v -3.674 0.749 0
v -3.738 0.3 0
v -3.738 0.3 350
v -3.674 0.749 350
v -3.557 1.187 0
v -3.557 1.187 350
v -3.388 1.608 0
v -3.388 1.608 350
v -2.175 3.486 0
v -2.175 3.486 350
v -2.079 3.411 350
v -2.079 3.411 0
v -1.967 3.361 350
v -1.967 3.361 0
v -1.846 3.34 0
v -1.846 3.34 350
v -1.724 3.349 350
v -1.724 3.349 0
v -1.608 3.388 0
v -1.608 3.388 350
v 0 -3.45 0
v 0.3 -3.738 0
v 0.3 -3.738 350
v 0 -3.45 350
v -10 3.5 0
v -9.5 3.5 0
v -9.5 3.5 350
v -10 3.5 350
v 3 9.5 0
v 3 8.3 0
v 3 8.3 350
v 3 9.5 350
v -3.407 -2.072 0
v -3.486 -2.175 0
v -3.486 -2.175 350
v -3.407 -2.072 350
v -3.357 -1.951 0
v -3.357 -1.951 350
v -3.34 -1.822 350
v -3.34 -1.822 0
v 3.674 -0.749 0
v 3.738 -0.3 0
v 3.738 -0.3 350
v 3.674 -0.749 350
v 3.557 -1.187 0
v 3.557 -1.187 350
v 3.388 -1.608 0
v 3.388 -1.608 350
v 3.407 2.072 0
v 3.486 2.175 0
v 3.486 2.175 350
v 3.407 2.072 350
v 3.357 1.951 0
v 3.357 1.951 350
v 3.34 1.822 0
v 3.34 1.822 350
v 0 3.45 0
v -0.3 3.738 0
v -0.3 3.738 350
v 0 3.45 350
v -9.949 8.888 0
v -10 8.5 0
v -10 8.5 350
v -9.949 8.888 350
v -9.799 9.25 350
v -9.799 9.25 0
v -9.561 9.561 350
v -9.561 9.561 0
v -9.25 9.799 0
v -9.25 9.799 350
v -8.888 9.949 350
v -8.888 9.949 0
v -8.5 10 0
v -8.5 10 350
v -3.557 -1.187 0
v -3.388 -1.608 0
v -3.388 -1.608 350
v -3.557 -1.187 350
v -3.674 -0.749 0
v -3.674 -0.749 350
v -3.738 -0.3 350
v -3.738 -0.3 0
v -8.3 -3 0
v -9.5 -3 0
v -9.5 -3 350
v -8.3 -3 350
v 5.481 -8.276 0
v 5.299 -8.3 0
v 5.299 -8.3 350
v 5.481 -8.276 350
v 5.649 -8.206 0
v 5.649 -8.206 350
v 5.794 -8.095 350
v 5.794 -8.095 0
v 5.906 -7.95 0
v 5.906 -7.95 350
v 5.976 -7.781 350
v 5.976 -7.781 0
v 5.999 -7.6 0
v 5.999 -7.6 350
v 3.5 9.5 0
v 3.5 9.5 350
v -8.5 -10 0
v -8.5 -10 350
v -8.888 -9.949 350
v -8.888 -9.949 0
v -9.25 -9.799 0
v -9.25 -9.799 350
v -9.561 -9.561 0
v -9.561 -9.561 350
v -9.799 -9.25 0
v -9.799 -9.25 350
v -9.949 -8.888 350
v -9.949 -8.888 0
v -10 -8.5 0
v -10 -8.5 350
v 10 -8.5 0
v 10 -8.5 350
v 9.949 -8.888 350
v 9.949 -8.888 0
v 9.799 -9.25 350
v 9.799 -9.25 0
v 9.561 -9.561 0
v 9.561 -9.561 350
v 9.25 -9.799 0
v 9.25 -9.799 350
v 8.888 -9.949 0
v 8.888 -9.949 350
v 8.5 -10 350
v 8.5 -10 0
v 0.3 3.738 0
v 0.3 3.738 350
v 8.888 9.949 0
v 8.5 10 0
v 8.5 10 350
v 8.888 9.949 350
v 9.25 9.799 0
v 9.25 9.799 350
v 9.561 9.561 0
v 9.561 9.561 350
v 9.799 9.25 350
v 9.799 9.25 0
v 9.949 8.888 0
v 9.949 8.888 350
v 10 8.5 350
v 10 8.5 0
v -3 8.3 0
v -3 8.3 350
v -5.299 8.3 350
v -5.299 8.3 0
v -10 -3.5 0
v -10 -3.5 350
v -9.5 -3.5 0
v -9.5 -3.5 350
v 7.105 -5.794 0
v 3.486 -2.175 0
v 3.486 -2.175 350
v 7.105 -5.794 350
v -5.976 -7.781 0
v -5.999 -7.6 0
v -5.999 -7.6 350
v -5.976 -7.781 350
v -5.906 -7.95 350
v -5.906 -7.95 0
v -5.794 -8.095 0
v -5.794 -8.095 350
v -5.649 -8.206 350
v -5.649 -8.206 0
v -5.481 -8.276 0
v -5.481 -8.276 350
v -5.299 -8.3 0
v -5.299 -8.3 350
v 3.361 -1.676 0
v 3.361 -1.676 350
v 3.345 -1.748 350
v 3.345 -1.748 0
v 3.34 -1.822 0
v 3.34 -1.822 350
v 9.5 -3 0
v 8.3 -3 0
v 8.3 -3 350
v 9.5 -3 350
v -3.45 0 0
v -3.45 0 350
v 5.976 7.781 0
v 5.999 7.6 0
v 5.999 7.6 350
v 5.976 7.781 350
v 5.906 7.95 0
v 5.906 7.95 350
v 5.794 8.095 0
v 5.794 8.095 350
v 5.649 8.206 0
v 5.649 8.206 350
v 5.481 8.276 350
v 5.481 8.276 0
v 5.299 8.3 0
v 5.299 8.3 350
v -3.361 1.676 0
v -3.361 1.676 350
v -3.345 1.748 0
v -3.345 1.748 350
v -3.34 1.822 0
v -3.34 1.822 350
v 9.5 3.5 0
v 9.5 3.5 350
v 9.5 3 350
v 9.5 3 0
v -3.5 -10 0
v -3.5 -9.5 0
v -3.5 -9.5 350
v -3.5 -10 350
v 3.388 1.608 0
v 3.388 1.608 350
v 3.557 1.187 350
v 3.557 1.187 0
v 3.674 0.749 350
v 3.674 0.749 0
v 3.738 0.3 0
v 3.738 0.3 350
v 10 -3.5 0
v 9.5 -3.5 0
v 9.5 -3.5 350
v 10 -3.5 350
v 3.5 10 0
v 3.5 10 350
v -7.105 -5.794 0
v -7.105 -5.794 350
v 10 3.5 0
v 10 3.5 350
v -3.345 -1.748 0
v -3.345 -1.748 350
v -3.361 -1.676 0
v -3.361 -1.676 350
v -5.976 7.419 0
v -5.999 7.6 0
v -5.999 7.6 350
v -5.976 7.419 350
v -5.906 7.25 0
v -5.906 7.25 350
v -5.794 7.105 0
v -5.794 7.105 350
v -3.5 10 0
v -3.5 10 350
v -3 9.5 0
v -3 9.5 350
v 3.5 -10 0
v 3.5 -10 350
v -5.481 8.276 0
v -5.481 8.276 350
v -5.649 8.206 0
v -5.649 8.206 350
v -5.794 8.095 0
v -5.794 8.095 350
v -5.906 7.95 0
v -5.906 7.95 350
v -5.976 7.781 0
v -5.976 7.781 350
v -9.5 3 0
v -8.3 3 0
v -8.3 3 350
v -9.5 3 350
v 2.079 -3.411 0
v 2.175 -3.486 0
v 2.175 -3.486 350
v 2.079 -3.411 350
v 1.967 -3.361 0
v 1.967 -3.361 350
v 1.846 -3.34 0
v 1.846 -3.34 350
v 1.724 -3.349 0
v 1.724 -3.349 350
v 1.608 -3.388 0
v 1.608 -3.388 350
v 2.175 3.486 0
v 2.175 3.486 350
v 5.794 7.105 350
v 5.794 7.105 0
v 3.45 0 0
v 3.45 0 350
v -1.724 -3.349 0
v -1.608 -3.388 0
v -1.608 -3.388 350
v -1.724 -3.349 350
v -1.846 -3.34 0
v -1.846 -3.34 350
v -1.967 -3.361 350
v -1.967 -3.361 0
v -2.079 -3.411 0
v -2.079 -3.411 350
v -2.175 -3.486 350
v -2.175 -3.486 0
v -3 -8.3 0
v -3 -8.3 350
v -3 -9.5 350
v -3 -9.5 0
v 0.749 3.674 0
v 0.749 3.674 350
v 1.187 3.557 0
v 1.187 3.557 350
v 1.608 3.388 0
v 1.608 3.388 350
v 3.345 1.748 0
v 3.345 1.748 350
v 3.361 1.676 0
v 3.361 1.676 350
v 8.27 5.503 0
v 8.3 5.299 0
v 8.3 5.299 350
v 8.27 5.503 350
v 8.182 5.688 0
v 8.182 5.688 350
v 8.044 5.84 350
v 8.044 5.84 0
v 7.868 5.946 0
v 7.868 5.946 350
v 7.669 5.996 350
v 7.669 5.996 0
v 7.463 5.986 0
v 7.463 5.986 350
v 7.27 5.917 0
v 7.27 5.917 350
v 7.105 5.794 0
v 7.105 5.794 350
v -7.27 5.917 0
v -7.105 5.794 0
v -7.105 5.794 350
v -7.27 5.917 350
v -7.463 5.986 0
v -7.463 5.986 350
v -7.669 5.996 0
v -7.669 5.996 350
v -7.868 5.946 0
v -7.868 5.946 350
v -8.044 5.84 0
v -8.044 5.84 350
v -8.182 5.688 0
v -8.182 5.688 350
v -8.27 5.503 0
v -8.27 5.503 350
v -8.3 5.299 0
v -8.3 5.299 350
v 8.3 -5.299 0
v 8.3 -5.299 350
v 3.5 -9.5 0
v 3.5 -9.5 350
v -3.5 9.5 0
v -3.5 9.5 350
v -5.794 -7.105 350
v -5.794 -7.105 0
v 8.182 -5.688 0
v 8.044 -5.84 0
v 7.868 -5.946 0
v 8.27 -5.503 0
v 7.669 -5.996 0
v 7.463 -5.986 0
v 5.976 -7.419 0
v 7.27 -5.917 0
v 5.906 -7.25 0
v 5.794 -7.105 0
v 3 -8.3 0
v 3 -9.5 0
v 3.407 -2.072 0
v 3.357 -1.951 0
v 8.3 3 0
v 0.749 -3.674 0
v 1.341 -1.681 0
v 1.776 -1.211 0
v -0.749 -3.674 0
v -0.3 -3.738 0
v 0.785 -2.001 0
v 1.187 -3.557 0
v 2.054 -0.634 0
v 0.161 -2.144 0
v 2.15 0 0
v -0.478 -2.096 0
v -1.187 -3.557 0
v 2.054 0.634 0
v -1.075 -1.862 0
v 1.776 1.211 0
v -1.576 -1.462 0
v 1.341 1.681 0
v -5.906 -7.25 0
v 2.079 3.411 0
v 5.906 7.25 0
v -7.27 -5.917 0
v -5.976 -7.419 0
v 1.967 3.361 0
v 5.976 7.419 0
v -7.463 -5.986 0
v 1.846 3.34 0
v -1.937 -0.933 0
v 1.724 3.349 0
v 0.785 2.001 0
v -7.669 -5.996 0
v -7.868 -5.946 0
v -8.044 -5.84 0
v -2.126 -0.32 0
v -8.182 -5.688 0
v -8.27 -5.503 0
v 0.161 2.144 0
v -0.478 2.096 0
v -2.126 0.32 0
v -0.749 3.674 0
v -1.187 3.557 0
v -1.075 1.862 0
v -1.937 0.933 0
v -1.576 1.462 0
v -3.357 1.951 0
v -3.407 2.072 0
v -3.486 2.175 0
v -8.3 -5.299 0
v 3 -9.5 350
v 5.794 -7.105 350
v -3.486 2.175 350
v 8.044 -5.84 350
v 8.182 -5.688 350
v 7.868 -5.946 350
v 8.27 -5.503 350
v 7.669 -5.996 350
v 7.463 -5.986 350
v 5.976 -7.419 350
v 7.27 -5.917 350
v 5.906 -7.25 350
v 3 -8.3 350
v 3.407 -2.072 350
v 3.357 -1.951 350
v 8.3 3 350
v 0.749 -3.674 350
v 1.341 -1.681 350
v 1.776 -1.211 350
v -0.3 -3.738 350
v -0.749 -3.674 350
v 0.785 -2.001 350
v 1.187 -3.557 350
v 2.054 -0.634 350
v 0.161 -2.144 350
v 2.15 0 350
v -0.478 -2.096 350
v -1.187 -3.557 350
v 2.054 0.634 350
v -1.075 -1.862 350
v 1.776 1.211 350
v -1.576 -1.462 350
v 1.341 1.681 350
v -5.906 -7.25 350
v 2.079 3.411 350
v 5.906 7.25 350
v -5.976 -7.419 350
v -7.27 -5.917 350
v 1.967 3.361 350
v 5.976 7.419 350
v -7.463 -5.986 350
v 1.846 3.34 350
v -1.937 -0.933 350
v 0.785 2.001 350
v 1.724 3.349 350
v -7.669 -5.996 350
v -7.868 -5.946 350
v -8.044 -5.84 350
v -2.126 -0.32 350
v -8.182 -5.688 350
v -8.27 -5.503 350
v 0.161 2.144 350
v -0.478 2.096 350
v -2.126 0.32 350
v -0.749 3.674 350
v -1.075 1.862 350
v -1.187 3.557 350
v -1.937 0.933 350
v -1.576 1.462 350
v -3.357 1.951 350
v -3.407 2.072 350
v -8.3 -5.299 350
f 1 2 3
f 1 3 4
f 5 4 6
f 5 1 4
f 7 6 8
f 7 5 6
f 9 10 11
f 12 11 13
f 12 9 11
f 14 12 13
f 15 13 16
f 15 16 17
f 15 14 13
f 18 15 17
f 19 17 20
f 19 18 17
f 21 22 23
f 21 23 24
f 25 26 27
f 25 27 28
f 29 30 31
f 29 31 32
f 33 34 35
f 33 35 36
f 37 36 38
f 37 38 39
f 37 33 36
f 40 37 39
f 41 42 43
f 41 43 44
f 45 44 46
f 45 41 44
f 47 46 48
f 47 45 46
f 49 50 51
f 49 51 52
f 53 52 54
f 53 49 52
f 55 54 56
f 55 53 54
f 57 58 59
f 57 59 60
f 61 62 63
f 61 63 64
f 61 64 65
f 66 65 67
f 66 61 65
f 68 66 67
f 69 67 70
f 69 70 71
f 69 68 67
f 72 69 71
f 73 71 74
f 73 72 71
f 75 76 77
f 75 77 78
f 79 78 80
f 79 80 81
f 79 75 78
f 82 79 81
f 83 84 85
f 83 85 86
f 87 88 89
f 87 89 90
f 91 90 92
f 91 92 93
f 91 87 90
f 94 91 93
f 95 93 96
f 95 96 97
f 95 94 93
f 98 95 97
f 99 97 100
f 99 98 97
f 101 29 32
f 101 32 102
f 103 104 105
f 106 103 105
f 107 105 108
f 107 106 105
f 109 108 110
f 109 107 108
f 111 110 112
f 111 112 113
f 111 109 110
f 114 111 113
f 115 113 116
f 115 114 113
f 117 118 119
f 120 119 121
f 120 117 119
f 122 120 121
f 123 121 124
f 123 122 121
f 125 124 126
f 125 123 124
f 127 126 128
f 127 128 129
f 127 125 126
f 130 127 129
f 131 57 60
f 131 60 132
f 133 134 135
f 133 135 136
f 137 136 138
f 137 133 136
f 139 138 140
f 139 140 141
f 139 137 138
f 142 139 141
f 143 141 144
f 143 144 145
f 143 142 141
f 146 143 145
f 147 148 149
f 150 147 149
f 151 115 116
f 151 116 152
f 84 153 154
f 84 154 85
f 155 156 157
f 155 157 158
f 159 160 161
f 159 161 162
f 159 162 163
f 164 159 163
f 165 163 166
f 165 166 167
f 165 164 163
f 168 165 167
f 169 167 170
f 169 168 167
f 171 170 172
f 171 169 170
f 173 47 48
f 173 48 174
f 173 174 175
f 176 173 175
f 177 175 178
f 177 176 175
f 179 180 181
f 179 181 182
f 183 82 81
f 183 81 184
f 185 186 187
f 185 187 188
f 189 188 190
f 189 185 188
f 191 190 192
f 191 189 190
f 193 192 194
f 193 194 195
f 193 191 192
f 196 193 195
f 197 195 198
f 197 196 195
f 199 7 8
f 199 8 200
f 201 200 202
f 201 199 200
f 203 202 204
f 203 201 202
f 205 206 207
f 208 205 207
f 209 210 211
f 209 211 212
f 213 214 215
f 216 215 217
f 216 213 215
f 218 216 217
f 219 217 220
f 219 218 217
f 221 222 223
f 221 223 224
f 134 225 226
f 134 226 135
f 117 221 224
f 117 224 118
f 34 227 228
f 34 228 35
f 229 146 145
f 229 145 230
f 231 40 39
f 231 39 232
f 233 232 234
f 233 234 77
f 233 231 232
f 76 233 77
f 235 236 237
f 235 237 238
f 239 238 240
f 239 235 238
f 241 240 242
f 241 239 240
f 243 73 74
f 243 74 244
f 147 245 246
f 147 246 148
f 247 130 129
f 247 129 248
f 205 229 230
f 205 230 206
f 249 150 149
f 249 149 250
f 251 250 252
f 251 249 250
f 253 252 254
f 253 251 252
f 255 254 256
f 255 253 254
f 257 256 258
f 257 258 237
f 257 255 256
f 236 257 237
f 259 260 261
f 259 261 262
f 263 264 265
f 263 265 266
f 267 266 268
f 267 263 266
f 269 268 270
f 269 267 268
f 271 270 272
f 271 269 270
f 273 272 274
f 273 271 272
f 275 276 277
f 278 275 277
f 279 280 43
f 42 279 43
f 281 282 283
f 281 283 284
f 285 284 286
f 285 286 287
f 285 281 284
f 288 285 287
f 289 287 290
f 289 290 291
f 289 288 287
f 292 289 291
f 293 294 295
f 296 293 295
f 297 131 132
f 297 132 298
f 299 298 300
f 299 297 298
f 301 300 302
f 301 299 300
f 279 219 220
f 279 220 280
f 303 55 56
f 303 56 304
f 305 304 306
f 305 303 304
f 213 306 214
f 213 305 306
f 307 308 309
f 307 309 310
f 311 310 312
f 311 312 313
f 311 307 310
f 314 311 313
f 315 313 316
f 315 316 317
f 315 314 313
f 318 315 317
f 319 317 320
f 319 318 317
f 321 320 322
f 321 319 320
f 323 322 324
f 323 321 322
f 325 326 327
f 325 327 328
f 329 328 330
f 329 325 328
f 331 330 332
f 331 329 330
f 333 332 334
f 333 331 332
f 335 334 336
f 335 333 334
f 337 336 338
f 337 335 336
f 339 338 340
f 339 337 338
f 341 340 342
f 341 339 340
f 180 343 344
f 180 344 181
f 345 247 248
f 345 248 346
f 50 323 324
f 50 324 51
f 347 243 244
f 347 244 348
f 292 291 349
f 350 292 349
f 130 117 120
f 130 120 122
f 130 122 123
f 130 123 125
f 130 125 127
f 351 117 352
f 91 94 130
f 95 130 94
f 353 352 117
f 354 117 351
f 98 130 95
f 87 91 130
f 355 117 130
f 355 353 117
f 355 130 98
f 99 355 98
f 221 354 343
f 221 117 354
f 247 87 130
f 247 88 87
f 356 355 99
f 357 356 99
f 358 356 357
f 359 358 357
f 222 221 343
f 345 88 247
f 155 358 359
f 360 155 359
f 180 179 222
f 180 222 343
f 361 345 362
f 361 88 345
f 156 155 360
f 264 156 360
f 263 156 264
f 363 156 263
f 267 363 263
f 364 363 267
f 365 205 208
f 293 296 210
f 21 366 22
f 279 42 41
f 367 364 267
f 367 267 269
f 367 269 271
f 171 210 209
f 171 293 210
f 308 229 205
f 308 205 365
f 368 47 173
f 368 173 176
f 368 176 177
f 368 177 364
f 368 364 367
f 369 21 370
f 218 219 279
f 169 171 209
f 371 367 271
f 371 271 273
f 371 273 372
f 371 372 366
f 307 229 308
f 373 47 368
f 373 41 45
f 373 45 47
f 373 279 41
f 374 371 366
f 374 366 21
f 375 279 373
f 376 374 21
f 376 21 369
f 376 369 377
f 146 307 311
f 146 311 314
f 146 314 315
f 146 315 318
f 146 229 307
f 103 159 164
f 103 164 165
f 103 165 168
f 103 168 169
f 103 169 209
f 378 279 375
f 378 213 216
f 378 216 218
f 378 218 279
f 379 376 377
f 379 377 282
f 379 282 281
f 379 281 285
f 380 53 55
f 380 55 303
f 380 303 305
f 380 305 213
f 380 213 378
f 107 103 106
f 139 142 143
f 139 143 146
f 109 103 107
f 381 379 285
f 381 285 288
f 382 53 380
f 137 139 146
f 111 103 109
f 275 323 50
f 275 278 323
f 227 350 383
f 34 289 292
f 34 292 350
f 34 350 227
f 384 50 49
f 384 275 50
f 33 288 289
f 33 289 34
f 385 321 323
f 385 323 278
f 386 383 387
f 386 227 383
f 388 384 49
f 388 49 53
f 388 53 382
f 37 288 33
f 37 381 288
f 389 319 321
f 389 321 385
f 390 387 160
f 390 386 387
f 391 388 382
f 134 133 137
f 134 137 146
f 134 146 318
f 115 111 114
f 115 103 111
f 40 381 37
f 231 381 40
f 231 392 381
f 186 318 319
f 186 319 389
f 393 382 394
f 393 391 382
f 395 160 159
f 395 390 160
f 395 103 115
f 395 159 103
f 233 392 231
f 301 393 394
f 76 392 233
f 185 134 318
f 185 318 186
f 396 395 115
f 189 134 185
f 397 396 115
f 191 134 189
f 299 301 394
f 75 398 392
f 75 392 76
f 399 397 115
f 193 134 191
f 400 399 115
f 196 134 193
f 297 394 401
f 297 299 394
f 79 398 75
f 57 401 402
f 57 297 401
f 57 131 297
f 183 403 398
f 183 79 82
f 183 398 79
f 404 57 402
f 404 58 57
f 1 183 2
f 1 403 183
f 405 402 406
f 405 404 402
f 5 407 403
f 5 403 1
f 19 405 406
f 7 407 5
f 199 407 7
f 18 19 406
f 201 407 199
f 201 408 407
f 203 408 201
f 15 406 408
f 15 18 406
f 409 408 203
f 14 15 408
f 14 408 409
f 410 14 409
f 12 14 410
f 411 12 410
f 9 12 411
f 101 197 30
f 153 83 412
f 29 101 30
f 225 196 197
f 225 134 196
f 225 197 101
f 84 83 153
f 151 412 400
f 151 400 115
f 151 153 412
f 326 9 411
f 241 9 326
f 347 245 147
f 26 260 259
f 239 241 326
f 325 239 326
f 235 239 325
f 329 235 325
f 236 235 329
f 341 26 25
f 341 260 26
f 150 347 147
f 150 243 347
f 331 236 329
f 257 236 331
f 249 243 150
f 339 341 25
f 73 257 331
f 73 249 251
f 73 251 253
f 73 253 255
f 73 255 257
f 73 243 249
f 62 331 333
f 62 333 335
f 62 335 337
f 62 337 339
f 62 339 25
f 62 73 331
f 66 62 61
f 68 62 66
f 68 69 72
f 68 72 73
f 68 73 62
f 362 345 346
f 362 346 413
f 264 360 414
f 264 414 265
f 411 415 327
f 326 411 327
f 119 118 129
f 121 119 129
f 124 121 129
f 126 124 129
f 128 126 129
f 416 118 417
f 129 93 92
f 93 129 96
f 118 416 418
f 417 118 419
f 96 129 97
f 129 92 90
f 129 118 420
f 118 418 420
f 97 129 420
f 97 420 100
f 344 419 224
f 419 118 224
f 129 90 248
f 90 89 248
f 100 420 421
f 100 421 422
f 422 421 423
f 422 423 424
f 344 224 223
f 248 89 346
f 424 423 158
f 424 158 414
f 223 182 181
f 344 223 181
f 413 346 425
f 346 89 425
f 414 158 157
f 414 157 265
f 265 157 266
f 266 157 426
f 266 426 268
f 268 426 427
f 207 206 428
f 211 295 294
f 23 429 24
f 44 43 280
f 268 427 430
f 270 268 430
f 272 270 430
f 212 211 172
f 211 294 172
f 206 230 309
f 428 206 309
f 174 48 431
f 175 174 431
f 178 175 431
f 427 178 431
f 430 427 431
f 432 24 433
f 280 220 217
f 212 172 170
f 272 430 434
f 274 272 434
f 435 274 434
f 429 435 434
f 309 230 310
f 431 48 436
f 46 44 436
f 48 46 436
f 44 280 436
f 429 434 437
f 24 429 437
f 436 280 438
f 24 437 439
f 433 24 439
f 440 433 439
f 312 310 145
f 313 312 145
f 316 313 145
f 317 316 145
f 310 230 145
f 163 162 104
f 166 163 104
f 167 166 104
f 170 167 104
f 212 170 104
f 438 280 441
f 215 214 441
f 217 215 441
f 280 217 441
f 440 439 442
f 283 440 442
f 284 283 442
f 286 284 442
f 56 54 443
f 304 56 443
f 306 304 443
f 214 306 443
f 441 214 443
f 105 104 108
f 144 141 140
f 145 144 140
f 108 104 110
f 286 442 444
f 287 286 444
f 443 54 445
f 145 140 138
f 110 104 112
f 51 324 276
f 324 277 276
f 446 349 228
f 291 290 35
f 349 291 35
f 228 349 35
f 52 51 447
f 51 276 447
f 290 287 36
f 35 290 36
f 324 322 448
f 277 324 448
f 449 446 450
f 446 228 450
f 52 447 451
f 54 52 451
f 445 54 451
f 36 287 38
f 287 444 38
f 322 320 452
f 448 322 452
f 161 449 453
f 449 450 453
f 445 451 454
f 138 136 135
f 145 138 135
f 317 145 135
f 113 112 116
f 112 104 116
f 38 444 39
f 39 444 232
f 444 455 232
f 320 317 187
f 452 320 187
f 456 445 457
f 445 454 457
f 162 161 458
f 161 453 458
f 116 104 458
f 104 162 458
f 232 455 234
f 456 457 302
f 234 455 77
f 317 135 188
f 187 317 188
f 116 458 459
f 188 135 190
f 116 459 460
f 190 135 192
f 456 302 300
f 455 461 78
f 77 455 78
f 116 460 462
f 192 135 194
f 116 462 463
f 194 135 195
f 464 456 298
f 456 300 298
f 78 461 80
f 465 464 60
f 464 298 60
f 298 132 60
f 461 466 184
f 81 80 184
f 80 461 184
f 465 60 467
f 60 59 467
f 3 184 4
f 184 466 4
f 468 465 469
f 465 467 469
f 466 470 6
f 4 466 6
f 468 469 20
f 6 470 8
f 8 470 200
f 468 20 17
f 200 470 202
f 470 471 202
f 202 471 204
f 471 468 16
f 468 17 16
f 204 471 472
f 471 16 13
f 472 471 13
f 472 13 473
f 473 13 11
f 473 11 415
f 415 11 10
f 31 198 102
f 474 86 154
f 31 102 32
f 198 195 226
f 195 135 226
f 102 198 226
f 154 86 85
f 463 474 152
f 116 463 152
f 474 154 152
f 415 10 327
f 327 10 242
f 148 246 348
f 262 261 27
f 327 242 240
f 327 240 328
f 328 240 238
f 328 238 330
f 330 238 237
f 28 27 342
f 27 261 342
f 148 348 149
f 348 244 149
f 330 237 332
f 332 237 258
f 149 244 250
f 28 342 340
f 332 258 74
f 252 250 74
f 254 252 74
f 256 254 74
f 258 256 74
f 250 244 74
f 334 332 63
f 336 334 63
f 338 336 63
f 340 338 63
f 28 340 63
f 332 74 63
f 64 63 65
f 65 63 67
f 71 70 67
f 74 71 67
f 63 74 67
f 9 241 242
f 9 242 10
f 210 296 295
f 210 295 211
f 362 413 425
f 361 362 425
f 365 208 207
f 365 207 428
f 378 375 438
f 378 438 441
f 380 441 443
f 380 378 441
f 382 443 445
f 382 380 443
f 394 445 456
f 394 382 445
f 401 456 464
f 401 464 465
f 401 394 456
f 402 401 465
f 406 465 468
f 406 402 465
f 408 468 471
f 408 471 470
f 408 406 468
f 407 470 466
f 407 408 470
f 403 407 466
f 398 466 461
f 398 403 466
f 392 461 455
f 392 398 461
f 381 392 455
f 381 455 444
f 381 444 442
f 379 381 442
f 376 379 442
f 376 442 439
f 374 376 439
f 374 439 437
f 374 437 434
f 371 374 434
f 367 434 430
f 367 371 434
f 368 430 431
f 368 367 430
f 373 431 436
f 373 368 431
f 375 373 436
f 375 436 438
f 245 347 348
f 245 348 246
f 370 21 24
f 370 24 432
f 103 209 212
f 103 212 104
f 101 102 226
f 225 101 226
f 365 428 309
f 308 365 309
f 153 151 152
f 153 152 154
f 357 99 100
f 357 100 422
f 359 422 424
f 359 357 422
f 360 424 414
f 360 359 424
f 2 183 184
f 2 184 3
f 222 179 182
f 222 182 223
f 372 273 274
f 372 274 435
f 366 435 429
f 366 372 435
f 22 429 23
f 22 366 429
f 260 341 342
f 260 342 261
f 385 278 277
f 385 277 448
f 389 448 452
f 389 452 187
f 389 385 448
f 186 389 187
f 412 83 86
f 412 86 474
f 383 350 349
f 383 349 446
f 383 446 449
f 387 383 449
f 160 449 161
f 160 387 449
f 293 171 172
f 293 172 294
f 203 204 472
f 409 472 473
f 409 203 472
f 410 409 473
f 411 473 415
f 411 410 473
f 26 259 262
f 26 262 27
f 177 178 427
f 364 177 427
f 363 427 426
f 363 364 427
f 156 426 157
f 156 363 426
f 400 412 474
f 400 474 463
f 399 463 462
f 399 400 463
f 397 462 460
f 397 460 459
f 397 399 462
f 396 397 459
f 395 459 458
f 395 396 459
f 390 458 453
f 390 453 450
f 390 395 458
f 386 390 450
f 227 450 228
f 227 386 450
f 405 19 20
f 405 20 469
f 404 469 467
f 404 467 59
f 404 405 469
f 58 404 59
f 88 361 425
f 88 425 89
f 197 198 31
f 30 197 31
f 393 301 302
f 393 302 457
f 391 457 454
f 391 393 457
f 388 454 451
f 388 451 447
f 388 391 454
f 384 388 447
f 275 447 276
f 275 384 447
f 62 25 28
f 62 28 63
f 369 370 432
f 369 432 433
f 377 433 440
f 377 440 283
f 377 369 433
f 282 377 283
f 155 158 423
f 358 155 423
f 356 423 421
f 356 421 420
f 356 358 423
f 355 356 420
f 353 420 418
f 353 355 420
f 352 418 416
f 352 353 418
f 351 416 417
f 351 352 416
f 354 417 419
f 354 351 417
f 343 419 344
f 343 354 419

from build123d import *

# Parameters (mm, degrees)
SALIENTE_EXTRUIR1_DEPTH = 350


with BuildPart() as part:
    # Model → Saliente-Extruir1 (new body)
    with BuildSketch(Plane.XY):
        with BuildLine():
            Line((-3.499999575, -9.499999701), (-3.499999575, -9.999999682))
            Line((-3.499999575, -9.999999682), (-8.499999389, -9.999999682))
            ThreePointArc((-8.499999389, -9.999999682), (-9.560659521, -9.56065987), (-9.999999333, -8.499999738))
            Line((-9.999999333, -8.499999738), (-9.999999333, -3.499999924))
            Line((-9.999999333, -3.499999924), (-9.499999352, -3.499999924))
            Line((-9.499999352, -3.499999924), (-9.499999352, -2.999999943))
            Line((-9.499999352, -2.999999943), (-8.299999404, -2.999999943))
            Line((-8.299999404, -2.999999943), (-8.299999404, -5.299390189))
            ThreePointArc((-8.299999404, -5.299390189), (-7.867877821, -5.946105837), (-7.1050247, -5.794364915))
            Line((-7.1050247, -5.794364915), (-3.486125369, -2.175465583))
            ThreePointArc((-3.486125369, -2.175465583), (-3.377738998, -2.013253915), (-3.339678766, -1.821912207))
            ThreePointArc((-3.339678766, -1.821912207), (-3.351896436, -1.712055945), (-3.38795236, -1.607568434))
            ThreePointArc((-3.38795236, -1.607568434), (-3.62245257, -0.969708302), (-3.737980238, -0.299999966))
            Line((-3.737980238, -0.299999966), (-3.449999511, 2.3e-08))
            Line((-3.449999511, 2.3e-08), (-3.737980238, 0.300000012))
            ThreePointArc((-3.737980238, 0.300000012), (-3.622452342, 0.969708679), (-3.387951787, 1.607569073))
            ThreePointArc((-3.387951787, 1.607569073), (-3.351896115, 1.712056255), (-3.339678532, 1.821912131))
            ThreePointArc((-3.339678532, 1.821912131), (-3.377738764, 2.013253839), (-3.486125135, 2.175465507))
            Line((-3.486125135, 2.175465507), (-7.105024467, 5.794364839))
            ThreePointArc((-7.105024467, 5.794364839), (-7.867877588, 5.946105761), (-8.29999917, 5.299390113))
            Line((-8.29999917, 5.299390113), (-8.29999917, 2.999999906))
            Line((-8.29999917, 2.999999906), (-9.499999593, 2.999999906))
            Line((-9.499999593, 2.999999906), (-9.499999593, 3.499999887))
            Line((-9.499999593, 3.499999887), (-9.999999574, 3.499999887))
            Line((-9.999999574, 3.499999887), (-9.999999574, 8.499999701))
            ThreePointArc((-9.999999574, 8.499999701), (-9.560659762, 9.560659833), (-8.49999963, 9.999999645))
            Line((-8.49999963, 9.999999645), (-3.499999816, 9.999999645))
            Line((-3.499999816, 9.999999645), (-3.499999816, 9.499999664))
            Line((-3.499999816, 9.499999664), (-2.999999429, 9.499999664))
            Line((-2.999999429, 9.499999664), (-2.999999429, 8.299999713))
            Line((-2.999999429, 8.299999713), (-5.299389679, 8.299999713))
            ThreePointArc((-5.299389679, 8.299999713), (-5.794364493, 8.094974382), (-5.999389653, 7.599999496))
            ThreePointArc((-5.999389653, 7.599999496), (-5.946105282, 7.332121235), (-5.794364409, 7.105025012))
            Line((-5.794364409, 7.105025012), (-2.175465068, 3.486125671))
            ThreePointArc((-2.175465068, 3.486125671), (-1.907084002, 3.346986792), (-1.607568017, 3.387952613))
            ThreePointArc((-1.607568017, 3.387952613), (-0.969707896, 3.622452871), (-0.299999565, 3.737980599))
            Line((-0.299999565, 3.737980599), (4.24e-07, 3.449999872))
            Line((4.24e-07, 3.449999872), (0.300000413, 3.737980599))
            ThreePointArc((0.300000413, 3.737980599), (0.969709153, 3.622452763), (1.607569631, 3.387952251))
            ThreePointArc((1.607569631, 3.387952251), (1.907085269, 3.346986863), (2.175465919, 3.486125671))
            Line((2.175465919, 3.486125671), (5.794365261, 7.105025012))
            ThreePointArc((5.794365261, 7.105025012), (5.94610618, 7.332121347), (5.999390505, 7.599999739))
            ThreePointArc((5.999390505, 7.599999739), (5.794365259, 8.094974467), (5.299390531, 8.299999713))
            Line((5.299390531, 8.299999713), (3.000000281, 8.299999713))
            Line((3.000000281, 8.299999713), (3.000000281, 9.499999668))
            Line((3.000000281, 9.499999668), (3.500000262, 9.499999668))
            Line((3.500000262, 9.499999668), (3.500000262, 9.99999965))
            Line((3.500000262, 9.99999965), (8.500000076, 9.99999965))
            ThreePointArc((8.500000076, 9.99999965), (9.560660208, 9.560659838), (10.00000002, 8.499999705))
            Line((10.00000002, 8.499999705), (10.00000002, 3.499999793))
            Line((10.00000002, 3.499999793), (9.499999853, 3.499999793))
            Line((9.499999853, 3.499999793), (9.499999853, 2.999999811))
            Line((9.499999853, 2.999999811), (8.299999905, 2.999999811))
            Line((8.299999905, 2.999999811), (8.299999905, 5.299390058))
            ThreePointArc((8.299999905, 5.299390058), (7.867878323, 5.946105706), (7.105025201, 5.794364783))
            Line((7.105025201, 5.794364783), (3.48612587, 2.175465452))
            ThreePointArc((3.48612587, 2.175465452), (3.377739466, 2.013253704), (3.339679267, 1.821911902))
            ThreePointArc((3.339679267, 1.821911902), (3.351896813, 1.712056363), (3.387952305, 1.607569476))
            ThreePointArc((3.387952305, 1.607569476), (3.622453002, 0.969708895), (3.73798096, 0.300000012))
            Line((3.73798096, 0.300000012), (3.450000233, 2.3e-08))
            Line((3.450000233, 2.3e-08), (3.73798096, -0.299999967))
            ThreePointArc((3.73798096, -0.299999967), (3.622453128, -0.969708902), (3.387952538, -1.607569553))
            ThreePointArc((3.387952538, -1.607569553), (3.351897009, -1.712056609), (3.339679501, -1.821912325))
            ThreePointArc((3.339679501, -1.821912325), (3.377739766, -2.01325394), (3.486126104, -2.175465528))
            Line((3.486126104, -2.175465528), (7.105025435, -5.79436486))
            ThreePointArc((7.105025435, -5.79436486), (7.867878557, -5.946105782), (8.300000139, -5.299390134))
            Line((8.300000139, -5.299390134), (8.300000139, -2.999999888))
            Line((8.300000139, -2.999999888), (9.500000087, -2.999999888))
            Line((9.500000087, -2.999999888), (9.500000087, -3.499999869))
            Line((9.500000087, -3.499999869), (10.000000005, -3.499999869))
            Line((10.000000005, -3.499999869), (10.000000005, -8.499999639))
            ThreePointArc((10.000000005, -8.499999639), (9.560660193, -9.560659771), (8.500000061, -9.999999583))
            Line((8.500000061, -9.999999583), (3.500000247, -9.999999583))
            Line((3.500000247, -9.999999583), (3.500000247, -9.499999602))
            Line((3.500000247, -9.499999602), (3.000000266, -9.499999602))
            Line((3.000000266, -9.499999602), (3.000000266, -8.299999646))
            Line((3.000000266, -8.299999646), (5.299390515, -8.299999646))
            ThreePointArc((5.299390515, -8.299999646), (5.794365244, -8.094974401), (5.999390489, -7.599999672))
            ThreePointArc((5.999390489, -7.599999672), (5.946106165, -7.332121281), (5.794365245, -7.105024946))
            Line((5.794365245, -7.105024946), (2.175465904, -3.486125604))
            ThreePointArc((2.175465904, -3.486125604), (1.907086046, -3.346986934), (1.607571067, -3.387951495))
            ThreePointArc((1.607571067, -3.387951495), (0.969709928, -3.622452532), (0.300000413, -3.737980599))
            Line((0.300000413, -3.737980599), (4.24e-07, -3.449999872))
            Line((4.24e-07, -3.449999872), (-0.299999565, -3.737980599))
            ThreePointArc((-0.299999565, -3.737980599), (-0.969708386, -3.622452718), (-1.607568921, -3.38795211))
            ThreePointArc((-1.607568921, -3.38795211), (-1.907084488, -3.346986812), (-2.175465053, -3.486125604))
            Line((-2.175465053, -3.486125604), (-5.794364394, -7.105024946))
            ThreePointArc((-5.794364394, -7.105024946), (-5.94610536, -7.332121393), (-5.999389638, -7.599999915))
            ThreePointArc((-5.999389638, -7.599999915), (-5.794364307, -8.094974487), (-5.299389664, -8.299999647))
            Line((-5.299389664, -8.299999647), (-2.999999594, -8.299999647))
            Line((-2.999999594, -8.299999647), (-2.999999594, -9.499999701))
            Line((-2.999999594, -9.499999701), (-3.499999575, -9.499999701))
        make_face()
        with BuildLine():
            ThreePointArc((-2.149999494, -7.27e-07), (7.98e-07, -2.150000275), (2.150000346, 1.7e-08))
            ThreePointArc((2.150000346, 1.7e-08), (5.3e-08, 2.149999565), (-2.149999494, -7.27e-07))
        make_face(mode=Mode.SUBTRACT)
    extrude(amount=SALIENTE_EXTRUIR1_DEPTH)


solid = part.part
